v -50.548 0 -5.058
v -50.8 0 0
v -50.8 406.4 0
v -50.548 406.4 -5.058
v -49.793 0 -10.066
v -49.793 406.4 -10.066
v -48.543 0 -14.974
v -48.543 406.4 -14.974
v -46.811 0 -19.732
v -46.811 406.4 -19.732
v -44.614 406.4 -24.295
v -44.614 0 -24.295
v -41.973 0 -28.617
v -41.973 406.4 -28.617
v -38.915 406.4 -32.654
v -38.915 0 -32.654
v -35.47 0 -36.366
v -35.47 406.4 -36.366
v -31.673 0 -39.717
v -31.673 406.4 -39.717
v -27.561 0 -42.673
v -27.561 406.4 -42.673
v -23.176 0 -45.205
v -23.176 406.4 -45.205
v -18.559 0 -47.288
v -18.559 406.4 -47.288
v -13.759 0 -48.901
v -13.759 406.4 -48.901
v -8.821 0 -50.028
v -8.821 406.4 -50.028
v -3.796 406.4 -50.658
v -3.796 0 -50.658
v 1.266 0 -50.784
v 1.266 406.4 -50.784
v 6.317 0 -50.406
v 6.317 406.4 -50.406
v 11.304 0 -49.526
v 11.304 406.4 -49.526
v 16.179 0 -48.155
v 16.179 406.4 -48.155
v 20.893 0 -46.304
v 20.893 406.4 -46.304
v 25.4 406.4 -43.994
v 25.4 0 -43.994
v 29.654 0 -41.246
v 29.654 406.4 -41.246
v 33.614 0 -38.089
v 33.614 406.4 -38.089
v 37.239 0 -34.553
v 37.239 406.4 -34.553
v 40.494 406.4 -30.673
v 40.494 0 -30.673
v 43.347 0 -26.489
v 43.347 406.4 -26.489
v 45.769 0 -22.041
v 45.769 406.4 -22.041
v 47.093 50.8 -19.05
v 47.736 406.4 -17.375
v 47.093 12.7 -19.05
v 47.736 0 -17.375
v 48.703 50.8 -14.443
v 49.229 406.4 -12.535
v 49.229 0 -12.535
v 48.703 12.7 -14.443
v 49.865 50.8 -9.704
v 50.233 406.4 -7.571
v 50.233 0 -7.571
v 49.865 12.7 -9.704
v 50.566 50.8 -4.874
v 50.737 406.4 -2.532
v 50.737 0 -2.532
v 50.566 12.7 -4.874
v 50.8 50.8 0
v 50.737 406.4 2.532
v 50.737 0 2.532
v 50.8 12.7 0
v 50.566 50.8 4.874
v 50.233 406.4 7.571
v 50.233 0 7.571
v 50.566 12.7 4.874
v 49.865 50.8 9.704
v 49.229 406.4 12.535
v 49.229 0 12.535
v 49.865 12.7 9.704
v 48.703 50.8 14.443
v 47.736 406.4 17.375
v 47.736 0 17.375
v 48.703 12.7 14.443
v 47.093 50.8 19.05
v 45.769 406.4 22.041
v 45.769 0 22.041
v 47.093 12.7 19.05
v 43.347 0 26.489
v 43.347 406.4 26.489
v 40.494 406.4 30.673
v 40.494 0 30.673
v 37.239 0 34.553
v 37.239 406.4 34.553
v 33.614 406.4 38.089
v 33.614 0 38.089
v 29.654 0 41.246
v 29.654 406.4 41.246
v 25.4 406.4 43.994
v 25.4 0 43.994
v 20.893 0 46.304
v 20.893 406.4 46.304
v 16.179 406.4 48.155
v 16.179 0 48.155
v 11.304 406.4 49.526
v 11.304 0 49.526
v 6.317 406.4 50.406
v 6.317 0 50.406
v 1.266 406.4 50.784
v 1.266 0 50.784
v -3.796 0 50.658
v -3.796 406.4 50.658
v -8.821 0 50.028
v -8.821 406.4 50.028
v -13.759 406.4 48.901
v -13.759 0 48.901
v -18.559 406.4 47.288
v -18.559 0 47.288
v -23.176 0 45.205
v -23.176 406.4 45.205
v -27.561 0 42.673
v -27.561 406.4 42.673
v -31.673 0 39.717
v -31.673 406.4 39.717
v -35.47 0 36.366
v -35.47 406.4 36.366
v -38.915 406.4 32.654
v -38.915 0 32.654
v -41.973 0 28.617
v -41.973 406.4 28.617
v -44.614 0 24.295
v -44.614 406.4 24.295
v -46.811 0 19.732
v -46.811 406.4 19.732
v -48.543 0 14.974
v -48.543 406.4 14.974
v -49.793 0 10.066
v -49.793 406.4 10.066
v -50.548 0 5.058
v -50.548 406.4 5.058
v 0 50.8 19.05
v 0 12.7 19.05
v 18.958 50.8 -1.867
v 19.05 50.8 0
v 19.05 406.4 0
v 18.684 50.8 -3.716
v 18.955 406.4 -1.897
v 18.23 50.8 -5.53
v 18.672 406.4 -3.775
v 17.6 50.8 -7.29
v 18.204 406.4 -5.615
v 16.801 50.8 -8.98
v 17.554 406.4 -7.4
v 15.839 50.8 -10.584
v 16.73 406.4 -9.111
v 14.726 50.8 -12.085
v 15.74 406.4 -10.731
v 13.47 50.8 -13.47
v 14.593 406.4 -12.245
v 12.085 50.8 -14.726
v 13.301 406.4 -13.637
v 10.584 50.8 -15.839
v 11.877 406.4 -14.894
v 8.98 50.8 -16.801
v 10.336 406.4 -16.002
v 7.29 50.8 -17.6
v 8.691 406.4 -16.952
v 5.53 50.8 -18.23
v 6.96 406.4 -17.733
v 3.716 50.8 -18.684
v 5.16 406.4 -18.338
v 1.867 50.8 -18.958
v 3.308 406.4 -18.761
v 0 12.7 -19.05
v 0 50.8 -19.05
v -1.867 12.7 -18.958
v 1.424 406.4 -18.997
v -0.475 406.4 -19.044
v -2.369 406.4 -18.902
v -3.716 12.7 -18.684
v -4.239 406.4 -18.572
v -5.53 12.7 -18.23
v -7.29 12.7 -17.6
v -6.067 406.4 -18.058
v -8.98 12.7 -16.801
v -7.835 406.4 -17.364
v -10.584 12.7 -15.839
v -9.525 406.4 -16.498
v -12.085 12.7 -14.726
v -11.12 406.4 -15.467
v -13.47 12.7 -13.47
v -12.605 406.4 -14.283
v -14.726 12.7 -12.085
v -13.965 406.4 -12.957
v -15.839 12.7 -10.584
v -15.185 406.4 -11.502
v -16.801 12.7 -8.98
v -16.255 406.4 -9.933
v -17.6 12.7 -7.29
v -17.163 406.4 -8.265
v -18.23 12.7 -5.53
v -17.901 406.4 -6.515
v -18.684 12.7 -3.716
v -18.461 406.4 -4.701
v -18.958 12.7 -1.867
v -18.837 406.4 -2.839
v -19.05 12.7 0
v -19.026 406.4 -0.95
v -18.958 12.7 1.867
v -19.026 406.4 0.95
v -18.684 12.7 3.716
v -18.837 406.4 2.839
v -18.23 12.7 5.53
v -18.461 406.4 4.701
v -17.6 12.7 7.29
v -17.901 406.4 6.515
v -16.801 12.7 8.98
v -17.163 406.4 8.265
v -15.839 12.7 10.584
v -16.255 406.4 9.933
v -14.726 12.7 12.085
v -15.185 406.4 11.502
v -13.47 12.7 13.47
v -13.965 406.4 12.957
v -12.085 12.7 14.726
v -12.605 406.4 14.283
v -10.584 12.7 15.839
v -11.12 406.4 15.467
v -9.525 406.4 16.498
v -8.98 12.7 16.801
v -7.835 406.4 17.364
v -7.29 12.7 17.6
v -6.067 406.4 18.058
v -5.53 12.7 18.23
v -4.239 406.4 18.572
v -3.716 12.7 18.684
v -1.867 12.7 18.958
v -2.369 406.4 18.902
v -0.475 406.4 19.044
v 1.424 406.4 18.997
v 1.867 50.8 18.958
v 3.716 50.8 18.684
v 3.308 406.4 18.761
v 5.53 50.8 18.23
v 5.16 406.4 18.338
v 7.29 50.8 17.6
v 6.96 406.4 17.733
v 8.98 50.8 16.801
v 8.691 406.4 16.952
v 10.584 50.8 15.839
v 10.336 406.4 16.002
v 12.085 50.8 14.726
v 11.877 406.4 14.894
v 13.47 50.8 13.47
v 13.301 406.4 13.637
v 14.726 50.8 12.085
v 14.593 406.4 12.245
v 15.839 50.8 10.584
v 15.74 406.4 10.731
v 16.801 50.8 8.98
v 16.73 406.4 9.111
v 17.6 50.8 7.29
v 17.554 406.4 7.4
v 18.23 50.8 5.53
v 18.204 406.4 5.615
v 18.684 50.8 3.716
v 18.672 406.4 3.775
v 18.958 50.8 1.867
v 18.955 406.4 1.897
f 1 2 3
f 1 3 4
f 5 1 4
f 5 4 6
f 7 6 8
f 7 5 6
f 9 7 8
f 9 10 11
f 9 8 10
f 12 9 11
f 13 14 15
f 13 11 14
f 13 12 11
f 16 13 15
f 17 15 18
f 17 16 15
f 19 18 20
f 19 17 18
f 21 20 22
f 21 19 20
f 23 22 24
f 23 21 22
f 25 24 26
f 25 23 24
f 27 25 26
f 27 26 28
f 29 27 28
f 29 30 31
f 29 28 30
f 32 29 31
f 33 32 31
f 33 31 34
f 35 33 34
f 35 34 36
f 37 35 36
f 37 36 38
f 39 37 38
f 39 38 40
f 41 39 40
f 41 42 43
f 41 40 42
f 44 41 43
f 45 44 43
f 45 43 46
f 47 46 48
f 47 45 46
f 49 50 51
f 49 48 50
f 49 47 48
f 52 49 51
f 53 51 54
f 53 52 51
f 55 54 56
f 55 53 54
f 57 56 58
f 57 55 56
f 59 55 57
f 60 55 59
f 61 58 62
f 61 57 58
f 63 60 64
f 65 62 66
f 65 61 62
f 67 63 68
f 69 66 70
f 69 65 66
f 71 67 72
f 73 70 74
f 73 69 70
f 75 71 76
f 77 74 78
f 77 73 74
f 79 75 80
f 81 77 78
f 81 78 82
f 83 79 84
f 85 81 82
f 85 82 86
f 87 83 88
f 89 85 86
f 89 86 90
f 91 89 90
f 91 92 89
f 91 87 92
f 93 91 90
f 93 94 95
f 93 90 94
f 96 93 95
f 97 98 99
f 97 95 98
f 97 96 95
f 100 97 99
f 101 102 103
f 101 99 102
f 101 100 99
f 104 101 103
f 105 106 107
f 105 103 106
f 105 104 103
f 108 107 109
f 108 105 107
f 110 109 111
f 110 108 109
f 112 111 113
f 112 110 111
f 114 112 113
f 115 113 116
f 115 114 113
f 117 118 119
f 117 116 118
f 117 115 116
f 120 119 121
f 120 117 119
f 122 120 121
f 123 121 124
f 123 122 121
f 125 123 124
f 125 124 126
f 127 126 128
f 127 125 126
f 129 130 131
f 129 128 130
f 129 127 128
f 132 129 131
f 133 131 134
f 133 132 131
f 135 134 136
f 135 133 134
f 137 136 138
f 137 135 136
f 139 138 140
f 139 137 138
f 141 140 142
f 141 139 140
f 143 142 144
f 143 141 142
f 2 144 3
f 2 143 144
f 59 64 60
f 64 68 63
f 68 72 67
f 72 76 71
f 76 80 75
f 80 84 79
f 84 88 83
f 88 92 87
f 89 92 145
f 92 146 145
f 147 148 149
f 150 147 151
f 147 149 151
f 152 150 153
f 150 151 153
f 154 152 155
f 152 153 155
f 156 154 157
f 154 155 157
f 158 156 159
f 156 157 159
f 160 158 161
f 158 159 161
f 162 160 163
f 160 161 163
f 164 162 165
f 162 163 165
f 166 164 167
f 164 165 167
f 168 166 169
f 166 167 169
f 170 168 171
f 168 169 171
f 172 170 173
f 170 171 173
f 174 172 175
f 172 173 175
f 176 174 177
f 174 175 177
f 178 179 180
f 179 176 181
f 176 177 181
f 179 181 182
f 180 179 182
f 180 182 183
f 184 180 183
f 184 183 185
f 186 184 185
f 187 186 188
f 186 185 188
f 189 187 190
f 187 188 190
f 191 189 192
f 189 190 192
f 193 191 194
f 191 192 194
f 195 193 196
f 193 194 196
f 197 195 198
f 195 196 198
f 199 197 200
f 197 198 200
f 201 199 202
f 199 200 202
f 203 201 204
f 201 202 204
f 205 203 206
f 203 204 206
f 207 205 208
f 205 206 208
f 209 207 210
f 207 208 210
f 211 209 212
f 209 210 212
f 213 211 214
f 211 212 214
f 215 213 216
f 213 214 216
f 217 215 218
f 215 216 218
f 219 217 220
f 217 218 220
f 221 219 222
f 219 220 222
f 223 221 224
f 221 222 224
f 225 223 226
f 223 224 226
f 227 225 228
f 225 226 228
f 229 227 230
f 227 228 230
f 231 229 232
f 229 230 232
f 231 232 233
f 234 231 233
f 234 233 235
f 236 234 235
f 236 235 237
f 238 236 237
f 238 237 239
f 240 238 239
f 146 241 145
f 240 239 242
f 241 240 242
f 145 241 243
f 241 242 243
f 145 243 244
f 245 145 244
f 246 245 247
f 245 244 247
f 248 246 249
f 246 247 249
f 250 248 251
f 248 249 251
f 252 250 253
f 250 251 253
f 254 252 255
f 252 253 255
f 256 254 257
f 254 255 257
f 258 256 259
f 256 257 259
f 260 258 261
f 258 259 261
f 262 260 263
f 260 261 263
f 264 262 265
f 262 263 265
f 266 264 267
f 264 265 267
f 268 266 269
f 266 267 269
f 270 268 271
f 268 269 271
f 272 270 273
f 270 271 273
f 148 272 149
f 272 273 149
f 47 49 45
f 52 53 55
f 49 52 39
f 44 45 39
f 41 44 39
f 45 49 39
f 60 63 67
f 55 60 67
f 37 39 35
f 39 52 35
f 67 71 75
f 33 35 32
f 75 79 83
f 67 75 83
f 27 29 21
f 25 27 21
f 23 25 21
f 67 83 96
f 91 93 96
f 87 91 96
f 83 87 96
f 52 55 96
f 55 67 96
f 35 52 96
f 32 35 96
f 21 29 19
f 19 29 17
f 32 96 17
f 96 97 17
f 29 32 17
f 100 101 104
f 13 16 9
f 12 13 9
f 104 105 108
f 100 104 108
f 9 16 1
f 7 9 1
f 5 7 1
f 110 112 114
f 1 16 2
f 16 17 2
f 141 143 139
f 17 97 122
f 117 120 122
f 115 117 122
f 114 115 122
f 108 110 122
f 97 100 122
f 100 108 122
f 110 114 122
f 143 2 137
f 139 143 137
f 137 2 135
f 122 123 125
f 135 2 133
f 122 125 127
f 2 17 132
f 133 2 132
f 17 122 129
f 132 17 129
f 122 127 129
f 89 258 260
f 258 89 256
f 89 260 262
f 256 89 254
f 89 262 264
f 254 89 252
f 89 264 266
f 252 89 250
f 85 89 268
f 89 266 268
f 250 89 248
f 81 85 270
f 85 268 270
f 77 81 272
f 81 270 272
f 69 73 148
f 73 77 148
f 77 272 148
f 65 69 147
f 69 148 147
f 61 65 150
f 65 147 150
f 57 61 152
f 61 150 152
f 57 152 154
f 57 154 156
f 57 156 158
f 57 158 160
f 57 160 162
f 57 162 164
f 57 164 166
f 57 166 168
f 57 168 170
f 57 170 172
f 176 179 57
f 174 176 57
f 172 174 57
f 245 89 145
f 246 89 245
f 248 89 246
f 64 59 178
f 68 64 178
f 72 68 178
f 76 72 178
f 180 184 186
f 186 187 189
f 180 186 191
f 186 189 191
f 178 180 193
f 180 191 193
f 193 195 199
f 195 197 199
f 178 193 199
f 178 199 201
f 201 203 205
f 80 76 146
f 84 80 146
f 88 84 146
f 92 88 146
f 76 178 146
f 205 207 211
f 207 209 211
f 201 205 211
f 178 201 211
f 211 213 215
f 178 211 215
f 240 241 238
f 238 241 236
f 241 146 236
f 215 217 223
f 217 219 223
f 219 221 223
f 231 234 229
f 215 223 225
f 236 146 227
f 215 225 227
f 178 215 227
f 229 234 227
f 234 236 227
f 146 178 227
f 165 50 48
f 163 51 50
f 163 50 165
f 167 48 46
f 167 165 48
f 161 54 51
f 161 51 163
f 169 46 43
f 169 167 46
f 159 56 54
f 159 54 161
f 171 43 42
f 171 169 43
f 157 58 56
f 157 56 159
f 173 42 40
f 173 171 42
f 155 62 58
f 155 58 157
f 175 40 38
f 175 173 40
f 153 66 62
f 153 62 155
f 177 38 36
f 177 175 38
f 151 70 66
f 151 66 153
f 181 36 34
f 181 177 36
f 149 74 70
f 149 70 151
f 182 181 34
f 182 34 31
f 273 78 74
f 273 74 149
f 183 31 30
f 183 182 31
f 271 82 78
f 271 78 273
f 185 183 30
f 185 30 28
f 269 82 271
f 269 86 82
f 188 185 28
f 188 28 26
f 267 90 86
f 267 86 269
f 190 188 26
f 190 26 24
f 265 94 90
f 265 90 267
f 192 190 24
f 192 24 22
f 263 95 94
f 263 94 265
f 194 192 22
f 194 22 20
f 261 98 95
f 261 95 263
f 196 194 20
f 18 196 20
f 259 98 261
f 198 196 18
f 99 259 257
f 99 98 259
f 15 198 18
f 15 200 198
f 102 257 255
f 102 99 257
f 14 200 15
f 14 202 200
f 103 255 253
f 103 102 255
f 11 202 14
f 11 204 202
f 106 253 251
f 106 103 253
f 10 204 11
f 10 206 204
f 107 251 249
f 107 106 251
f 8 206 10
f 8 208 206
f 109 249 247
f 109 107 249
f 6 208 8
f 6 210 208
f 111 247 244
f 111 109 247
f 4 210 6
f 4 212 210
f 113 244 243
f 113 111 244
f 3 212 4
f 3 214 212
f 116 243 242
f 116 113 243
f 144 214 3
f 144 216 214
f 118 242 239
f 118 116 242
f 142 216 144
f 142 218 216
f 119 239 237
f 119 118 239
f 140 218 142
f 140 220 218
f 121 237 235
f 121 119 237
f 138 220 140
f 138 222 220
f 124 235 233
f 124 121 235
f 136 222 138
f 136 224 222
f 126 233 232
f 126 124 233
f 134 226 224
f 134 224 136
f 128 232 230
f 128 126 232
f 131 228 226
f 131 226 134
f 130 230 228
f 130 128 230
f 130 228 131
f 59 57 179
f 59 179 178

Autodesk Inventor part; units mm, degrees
ref_plane "YZ Plane" through (0, 0, 0) normal (1, 0, 0) x (0, 1, 0)
ref_plane "XZ Plane" through (0, 0, 0) normal (0, 1, 0) x (-1, 0, 0)
ref_plane "XY Plane" through (0, 0, 0) normal (0, 0, 1) x (1, 0, 0)
sketch "Sketch1" plane through (0, 0, 0) normal (0, 1, 0) x (-1, 0, 0)
  circle A0 centre (0, 0) radius 50.8
  dimension "d0" = 101.6
extrude "Extrusion1" add sketch "Sketch1" along normal blind 406.4
sketch "Sketch2" plane through (0, 0, 0) normal (1, 0, 0) x (0, 1, 0)
  line L0 (0, -50.8) -> (0, 50.8) projected
  line L1 (12.7, 19.05) -> (50.8, 19.05)
  line L2 (50.8, 19.05) -> (50.8, -19.05)
  line L3 (50.8, -19.05) -> (12.7, -19.05)
  line L4 (12.7, -19.05) -> (12.7, 19.05)
  point P0 (0, 0)
  dimension "d5" = 38.1
  dimension "d6" = 38.1
extrude "Extrusion2" cut sketch "Sketch2" along normal blind 101.6
sketch "Sketch3" plane through (0, 406.4, 0) normal (0, 1, 0) x (1, 0, 0)
  circle A0 centre (0, 0) radius 19.05
  dimension "d9" = 38.1
extrude "Extrusion3" cut sketch "Sketch3" against normal blind 393.7
properties part number "Shaft Connecting Chassis"
